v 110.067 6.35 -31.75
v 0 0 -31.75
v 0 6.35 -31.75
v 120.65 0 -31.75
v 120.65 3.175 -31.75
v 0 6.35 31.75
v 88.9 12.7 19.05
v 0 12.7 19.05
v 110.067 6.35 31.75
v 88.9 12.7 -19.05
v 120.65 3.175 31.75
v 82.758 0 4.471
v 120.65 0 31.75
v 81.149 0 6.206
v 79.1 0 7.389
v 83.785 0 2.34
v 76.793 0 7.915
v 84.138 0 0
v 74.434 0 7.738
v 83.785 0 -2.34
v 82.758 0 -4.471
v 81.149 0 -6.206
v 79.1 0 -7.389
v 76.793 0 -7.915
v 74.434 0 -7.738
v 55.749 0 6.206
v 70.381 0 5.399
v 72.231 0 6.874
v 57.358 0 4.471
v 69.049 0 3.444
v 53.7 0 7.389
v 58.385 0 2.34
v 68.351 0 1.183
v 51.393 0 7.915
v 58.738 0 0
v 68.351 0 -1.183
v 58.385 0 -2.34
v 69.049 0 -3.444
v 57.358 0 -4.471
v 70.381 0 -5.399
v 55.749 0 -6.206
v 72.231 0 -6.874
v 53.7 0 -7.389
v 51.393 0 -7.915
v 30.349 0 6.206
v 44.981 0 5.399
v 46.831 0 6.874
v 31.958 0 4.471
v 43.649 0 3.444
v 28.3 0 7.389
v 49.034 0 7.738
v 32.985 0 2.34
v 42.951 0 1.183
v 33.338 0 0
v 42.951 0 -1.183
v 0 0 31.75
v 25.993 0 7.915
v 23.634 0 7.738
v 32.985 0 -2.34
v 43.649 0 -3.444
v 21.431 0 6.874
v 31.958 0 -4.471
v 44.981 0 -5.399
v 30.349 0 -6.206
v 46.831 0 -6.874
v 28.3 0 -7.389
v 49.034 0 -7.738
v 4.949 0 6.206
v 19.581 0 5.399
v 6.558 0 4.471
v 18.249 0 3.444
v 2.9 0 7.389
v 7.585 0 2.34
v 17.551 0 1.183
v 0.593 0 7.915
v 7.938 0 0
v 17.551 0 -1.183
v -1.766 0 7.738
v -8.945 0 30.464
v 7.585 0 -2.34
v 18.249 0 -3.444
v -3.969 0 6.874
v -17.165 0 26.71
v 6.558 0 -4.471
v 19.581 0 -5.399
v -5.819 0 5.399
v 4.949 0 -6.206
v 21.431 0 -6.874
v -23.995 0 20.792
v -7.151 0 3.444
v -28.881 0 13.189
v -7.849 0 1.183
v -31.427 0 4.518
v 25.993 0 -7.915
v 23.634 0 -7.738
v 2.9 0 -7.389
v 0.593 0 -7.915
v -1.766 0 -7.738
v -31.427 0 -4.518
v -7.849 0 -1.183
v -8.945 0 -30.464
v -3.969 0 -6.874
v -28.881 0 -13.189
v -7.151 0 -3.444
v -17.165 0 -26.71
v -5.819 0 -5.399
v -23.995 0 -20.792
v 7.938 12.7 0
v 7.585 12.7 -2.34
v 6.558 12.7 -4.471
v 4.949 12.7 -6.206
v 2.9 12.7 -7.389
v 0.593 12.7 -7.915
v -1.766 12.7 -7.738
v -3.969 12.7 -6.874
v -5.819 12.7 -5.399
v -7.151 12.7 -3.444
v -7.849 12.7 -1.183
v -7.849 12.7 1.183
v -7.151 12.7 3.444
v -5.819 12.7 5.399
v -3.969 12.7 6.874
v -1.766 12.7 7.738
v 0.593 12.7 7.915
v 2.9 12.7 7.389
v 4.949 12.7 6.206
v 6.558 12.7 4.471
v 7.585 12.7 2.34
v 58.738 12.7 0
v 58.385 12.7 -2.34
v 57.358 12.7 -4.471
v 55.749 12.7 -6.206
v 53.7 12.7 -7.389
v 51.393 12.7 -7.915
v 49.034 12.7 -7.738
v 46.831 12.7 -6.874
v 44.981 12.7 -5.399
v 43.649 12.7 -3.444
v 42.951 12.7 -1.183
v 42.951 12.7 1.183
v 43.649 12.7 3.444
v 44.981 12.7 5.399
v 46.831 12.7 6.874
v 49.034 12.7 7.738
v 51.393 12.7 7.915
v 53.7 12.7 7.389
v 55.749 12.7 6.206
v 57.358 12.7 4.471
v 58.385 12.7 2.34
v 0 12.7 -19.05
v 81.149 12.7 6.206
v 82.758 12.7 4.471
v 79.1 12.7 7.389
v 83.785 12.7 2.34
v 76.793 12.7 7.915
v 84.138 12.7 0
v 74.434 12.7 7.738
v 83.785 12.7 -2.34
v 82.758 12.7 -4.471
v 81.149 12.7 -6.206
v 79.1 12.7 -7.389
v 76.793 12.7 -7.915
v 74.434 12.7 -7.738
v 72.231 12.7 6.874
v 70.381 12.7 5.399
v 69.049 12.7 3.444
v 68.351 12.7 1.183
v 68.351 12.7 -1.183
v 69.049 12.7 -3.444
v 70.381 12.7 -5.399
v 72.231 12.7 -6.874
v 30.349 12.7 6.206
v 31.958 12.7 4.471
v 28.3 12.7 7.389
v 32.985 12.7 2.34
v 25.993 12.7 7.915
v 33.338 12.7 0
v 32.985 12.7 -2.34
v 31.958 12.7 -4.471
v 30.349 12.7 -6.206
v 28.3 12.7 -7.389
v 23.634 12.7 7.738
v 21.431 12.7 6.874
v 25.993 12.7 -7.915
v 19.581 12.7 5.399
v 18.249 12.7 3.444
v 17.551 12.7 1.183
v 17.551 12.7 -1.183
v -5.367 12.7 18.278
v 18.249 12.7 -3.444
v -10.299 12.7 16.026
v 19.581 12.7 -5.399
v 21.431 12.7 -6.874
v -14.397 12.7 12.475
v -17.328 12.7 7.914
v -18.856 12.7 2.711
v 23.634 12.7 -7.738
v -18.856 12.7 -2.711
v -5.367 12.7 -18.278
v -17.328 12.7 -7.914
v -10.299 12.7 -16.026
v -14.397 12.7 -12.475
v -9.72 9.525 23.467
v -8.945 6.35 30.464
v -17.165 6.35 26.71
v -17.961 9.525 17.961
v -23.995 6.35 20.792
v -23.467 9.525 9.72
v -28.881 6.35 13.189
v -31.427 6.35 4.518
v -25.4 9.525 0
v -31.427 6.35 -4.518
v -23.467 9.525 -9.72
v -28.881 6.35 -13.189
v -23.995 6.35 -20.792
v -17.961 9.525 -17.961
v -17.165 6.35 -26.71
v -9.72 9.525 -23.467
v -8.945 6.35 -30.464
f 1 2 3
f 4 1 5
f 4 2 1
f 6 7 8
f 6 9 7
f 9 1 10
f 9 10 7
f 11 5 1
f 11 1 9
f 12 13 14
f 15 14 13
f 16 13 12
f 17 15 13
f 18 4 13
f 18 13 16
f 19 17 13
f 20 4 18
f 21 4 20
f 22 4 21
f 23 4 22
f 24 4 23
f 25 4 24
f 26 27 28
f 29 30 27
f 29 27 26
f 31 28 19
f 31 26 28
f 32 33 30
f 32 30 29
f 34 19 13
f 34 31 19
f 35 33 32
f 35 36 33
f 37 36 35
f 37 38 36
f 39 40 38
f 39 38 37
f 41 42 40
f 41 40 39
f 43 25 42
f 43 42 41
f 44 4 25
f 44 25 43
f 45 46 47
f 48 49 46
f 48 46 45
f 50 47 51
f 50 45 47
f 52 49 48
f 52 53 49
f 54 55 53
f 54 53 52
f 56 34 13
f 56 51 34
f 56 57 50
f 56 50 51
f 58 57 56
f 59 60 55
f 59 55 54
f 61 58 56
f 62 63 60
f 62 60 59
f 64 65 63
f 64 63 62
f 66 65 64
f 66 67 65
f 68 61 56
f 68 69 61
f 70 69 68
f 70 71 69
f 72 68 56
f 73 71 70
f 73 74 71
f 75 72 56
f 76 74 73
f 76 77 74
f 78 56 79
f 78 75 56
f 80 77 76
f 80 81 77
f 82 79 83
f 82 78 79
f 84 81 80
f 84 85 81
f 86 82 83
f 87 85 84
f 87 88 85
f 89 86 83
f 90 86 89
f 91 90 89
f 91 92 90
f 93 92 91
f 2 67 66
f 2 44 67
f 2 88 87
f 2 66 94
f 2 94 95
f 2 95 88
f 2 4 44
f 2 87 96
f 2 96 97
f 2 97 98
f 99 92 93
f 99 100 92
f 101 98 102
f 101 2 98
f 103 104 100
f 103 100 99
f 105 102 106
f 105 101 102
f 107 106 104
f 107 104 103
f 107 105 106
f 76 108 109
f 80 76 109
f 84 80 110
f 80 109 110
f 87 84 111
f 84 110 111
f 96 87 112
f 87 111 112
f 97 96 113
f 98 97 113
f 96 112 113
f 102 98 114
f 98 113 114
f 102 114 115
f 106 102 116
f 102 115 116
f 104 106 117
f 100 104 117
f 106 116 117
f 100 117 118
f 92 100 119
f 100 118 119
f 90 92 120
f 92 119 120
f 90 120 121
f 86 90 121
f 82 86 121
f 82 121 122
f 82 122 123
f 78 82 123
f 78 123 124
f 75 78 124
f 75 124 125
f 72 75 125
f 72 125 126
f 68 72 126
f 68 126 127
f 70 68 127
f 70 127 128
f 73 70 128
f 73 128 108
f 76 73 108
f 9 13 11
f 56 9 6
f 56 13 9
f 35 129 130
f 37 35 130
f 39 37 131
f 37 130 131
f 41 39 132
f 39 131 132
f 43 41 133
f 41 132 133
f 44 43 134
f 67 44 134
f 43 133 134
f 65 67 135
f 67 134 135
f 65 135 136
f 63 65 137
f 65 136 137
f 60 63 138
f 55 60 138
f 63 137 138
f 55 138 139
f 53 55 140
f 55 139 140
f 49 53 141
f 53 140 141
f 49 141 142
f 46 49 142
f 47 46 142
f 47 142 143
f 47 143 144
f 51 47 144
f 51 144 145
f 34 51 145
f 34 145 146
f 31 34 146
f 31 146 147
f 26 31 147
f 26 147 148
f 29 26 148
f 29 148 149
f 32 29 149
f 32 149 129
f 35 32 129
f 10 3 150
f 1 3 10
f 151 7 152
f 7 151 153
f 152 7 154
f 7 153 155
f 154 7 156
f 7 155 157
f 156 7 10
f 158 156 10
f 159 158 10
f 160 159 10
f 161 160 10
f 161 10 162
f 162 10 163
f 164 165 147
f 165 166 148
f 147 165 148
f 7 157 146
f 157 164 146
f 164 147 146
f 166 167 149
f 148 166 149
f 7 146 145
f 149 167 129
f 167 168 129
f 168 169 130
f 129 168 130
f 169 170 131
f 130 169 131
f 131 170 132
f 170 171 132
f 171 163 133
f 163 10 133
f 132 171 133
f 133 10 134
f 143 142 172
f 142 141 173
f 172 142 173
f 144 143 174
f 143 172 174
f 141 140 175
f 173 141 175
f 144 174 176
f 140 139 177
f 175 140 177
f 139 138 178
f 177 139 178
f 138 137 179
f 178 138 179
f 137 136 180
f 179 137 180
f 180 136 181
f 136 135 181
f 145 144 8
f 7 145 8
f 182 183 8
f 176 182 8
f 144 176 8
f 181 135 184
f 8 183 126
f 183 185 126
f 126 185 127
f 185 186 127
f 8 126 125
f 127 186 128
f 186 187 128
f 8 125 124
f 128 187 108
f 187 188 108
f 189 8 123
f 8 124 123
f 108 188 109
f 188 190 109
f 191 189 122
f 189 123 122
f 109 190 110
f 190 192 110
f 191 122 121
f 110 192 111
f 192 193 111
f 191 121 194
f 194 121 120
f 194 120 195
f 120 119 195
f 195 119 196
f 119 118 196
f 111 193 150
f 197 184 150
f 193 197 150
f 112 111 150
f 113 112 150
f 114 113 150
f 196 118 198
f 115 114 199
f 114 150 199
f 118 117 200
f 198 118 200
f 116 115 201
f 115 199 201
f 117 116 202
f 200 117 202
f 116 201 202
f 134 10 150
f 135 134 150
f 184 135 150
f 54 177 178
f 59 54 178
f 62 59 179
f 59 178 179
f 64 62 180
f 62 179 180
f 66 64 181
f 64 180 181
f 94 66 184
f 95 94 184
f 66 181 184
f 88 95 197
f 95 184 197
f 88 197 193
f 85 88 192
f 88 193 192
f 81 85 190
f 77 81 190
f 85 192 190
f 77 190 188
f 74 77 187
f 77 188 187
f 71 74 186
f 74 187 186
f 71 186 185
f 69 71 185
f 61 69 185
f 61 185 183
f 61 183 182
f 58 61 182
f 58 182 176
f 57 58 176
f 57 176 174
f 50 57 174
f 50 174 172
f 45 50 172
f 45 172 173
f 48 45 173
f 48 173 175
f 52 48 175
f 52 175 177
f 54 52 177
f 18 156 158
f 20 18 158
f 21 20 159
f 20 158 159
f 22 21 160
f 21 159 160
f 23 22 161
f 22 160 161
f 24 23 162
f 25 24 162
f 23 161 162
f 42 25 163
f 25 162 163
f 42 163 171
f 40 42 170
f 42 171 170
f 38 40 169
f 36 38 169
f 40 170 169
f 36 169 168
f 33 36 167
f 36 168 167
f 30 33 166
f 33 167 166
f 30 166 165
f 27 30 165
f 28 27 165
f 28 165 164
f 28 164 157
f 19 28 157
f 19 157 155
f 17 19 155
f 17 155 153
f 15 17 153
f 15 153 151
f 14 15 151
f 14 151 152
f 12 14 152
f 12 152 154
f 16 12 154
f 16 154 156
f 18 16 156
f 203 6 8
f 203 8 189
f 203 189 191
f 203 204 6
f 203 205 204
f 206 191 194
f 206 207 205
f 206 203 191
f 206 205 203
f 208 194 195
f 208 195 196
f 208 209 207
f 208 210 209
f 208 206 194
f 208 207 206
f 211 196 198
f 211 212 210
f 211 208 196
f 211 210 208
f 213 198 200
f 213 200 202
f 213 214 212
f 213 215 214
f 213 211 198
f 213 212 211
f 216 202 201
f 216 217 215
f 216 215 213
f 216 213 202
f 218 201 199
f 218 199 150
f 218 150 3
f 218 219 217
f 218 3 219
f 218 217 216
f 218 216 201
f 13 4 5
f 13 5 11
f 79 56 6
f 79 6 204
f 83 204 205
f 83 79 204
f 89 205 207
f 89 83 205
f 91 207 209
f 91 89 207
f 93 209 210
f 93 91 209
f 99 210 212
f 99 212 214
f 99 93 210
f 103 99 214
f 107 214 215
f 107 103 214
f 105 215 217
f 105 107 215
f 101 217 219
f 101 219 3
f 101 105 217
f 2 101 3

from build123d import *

# Parameters (mm, degrees)
BOSS_EXTRUDE1_DEPTH = 12.7
CHAMFER2_SIZE       = 12.7
CHAMFER2_SIZE2      = 6.35
CHAMFER3_SIZE       = 31.75
CHAMFER3_SIZE2      = 9.525
SKETCH2_R           = 7.9375
CUT_EXTRUDE1_DEPTH  = 13.7


with BuildPart() as part:
    # Sketch1 → Boss-Extrude1 (new body)
    with BuildSketch(Plane(origin=(0, 0, 0), x_dir=(1, 0, 0), z_dir=(0, 1, 0))):
        with BuildLine():
            Line((0, 31.75), (120.65, 31.75))
            Line((120.65, 31.75), (120.65, -31.75))
            Line((120.65, -31.75), (0, -31.75))
            ThreePointArc((0, -31.75), (-31.75, 0), (0, 31.75))
        make_face()
    extrude(amount=BOSS_EXTRUDE1_DEPTH)

    # Chamfer2
    chamfer2_edges = [part.edges().sort_by_distance(p)[0] for p in [
        (60.325, 12.7, 31.75),
        (-31.75, 12.7, 0),
        (60.325, 12.7, -31.75),
    ]]
    chamfer2_side = [part.faces().sort_by_distance(p)[0] for p in [
        (47.684335989, 12.7, 0),
    ]]
    chamfer(chamfer2_edges, length=CHAMFER2_SIZE, length2=CHAMFER2_SIZE2, reference=chamfer2_side[0])

    # Chamfer3
    chamfer3_edges = [part.edges().sort_by_distance(p)[0] for p in [
        (120.65, 12.7, 0),
    ]]
    chamfer3_side = [part.faces().sort_by_distance(p)[0] for p in [
        (52.777427201, 12.7, 0),
    ]]
    chamfer(chamfer3_edges, length=CHAMFER3_SIZE, length2=CHAMFER3_SIZE2, reference=chamfer3_side[0])

    # Sketch2 → Cut-Extrude1 (cut, through all)
    with BuildSketch(Plane(origin=(0, 12.7, 0), x_dir=(1, 0, 0), z_dir=(0, 1, 0))):
        Circle(SKETCH2_R)
        with Locations((25.4, 0)):
            Circle(SKETCH2_R)
        with Locations((50.8, 0)):
            Circle(SKETCH2_R)
        with Locations((76.2, 0)):
            Circle(SKETCH2_R)
    extrude(amount=-CUT_EXTRUDE1_DEPTH, mode=Mode.SUBTRACT)


solid = part.part
